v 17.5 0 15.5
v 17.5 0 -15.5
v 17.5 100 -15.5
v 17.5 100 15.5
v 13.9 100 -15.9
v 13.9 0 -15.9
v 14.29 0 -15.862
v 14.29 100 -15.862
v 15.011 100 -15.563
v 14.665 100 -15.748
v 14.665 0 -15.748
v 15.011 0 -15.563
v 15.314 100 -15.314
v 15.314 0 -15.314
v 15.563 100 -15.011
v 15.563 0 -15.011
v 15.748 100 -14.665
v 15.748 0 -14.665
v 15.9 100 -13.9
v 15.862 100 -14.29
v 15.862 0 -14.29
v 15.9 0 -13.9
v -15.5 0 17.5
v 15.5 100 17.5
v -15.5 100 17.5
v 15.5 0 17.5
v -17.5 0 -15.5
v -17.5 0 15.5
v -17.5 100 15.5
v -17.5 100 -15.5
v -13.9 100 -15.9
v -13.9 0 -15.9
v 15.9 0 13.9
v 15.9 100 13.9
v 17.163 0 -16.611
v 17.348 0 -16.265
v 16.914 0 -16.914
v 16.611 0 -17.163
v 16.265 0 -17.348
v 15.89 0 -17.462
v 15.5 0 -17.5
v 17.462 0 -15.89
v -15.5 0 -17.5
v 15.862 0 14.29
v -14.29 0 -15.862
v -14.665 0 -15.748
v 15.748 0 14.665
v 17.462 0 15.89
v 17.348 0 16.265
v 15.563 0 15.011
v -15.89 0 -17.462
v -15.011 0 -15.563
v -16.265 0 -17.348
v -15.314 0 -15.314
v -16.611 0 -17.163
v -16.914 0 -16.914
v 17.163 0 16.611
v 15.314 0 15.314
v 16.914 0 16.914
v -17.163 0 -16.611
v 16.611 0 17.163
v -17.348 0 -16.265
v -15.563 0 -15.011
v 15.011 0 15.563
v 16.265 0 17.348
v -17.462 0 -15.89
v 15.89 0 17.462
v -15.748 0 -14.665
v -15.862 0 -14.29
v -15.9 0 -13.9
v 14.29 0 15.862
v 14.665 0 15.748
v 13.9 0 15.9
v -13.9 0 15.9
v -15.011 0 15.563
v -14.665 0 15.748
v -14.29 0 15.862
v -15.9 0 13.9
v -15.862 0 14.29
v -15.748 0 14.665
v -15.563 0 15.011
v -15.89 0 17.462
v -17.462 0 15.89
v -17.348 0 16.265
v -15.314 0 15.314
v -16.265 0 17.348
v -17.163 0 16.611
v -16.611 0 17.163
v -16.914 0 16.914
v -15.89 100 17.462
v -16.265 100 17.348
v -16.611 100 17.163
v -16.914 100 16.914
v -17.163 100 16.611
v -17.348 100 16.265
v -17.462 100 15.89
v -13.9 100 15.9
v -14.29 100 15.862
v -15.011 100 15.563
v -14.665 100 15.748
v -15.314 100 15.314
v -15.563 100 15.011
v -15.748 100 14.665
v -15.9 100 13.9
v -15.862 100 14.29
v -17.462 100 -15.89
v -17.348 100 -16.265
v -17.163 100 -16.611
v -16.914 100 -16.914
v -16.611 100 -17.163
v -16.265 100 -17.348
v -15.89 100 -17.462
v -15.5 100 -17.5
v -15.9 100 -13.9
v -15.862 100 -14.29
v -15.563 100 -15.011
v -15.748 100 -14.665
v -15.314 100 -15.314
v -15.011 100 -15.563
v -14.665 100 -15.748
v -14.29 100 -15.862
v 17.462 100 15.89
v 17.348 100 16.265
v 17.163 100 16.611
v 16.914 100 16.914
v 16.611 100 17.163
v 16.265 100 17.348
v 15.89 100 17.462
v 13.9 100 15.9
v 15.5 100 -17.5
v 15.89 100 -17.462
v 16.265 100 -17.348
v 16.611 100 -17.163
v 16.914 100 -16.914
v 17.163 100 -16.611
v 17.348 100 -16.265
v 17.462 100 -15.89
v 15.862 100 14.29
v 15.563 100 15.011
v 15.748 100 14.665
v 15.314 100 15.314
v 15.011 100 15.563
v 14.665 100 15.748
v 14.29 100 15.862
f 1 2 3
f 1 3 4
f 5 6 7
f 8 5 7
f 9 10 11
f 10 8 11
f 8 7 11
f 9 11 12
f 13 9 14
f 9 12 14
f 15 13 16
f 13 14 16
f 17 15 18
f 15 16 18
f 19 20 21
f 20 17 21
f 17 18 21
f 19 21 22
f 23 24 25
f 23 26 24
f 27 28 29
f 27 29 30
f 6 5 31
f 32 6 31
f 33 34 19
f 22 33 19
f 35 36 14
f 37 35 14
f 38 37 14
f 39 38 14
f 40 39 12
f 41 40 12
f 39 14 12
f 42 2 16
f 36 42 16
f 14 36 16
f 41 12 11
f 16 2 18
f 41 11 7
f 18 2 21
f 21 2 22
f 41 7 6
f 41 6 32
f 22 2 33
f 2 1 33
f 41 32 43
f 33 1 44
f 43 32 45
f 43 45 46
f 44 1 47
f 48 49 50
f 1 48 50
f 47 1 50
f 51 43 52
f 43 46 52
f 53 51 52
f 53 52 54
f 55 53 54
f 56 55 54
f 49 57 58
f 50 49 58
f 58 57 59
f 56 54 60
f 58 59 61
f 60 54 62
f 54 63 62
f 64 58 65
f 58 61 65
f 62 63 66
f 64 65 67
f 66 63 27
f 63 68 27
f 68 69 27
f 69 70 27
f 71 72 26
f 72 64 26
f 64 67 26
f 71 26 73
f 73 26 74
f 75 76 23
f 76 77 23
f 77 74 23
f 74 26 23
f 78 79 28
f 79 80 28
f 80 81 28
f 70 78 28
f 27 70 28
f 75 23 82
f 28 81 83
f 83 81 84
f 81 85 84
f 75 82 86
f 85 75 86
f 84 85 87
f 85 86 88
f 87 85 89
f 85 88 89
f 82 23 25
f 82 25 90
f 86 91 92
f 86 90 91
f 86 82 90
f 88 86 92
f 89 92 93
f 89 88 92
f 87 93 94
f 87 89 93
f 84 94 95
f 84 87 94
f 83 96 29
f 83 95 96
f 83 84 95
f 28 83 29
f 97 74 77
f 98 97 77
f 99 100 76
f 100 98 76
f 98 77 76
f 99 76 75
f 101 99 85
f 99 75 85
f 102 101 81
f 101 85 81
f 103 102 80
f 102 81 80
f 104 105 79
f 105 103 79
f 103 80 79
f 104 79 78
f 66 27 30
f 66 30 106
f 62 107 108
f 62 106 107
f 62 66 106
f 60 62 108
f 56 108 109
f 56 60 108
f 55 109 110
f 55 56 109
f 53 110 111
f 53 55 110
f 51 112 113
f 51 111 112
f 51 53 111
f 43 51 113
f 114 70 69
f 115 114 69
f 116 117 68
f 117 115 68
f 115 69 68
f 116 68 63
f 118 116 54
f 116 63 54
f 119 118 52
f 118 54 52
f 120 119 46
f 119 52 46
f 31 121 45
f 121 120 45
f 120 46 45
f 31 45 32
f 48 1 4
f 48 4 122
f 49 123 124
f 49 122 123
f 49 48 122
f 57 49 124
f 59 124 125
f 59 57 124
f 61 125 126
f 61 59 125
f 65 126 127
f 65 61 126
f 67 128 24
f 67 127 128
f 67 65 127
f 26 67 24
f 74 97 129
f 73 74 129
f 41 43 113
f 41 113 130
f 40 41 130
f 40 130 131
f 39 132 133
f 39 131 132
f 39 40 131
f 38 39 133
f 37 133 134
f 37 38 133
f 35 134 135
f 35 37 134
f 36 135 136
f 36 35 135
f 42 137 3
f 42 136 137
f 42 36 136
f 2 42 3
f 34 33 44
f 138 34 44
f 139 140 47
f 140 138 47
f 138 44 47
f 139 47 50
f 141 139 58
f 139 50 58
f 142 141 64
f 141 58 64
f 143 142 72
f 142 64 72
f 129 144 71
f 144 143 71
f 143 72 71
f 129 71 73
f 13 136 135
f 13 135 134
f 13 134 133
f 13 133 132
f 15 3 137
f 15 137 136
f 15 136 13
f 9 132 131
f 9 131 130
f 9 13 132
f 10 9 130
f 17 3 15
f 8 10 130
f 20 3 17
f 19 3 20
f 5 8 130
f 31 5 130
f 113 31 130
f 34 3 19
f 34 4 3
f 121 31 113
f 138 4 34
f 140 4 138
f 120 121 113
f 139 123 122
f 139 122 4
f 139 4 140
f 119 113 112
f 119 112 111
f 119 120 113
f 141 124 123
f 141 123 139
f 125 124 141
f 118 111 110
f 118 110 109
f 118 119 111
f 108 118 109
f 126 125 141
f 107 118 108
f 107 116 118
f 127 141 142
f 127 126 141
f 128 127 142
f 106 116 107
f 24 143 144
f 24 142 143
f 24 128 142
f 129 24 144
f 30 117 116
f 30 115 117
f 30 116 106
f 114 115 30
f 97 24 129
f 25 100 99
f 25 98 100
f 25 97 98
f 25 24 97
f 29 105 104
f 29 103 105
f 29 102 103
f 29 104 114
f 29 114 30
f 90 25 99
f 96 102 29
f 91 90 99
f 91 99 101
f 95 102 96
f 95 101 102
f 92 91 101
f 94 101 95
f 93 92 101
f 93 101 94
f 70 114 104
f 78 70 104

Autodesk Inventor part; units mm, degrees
ref_plane "YZ Plane" through (0, 0, 0) normal (1, 0, 0) x (0, 1, 0)
ref_plane "XZ Plane" through (0, 0, 0) normal (0, 1, 0) x (-1, 0, 0)
ref_plane "XY Plane" through (0, 0, 0) normal (0, 0, 1) x (1, 0, 0)
sketch "Sketch1" plane through (0, 0, 0) normal (0, 1, 0) x (-1, 0, 0)
  line L0 (-15.5, 17.5) -> (15.5, 17.5)
  line L1 (17.5, 15.5) -> (17.5, -15.5)
  line L2 (15.5, -17.5) -> (-15.5, -17.5)
  line L3 (-17.5, -15.5) -> (-17.5, 15.5)
  line L4 (-17.5, 17.5) -> (17.5, -17.5) construction
  line L5 (17.5, 17.5) -> (-17.5, -17.5) construction
  line L6 (-13.9, -15.9) -> (13.9, -15.9)
  line L7 (15.9, -13.9) -> (15.9, 13.9)
  line L8 (13.9, 15.9) -> (-13.9, 15.9)
  line L9 (-15.9, 13.9) -> (-15.9, -13.9)
  arc A0 (17.5, 15.5) -> (15.5, 17.5) centre (15.5, 15.5) ccw
  arc A1 (15.5, -17.5) -> (17.5, -15.5) centre (15.5, -15.5) ccw
  arc A2 (-17.5, -15.5) -> (-15.5, -17.5) centre (-15.5, -15.5) ccw
  arc A3 (-15.5, 17.5) -> (-17.5, 15.5) centre (-15.5, 15.5) ccw
  arc A4 (15.9, 13.9) -> (13.9, 15.9) centre (13.9, 13.9) ccw
  arc A5 (13.9, -15.9) -> (15.9, -13.9) centre (13.9, -13.9) ccw
  arc A6 (-15.9, -13.9) -> (-13.9, -15.9) centre (-13.9, -13.9) ccw
  arc A7 (-13.9, 15.9) -> (-15.9, 13.9) centre (-13.9, 13.9) ccw
  point P0 (0, 0)
  dimension "d0" = 35
  dimension "d1" = 35
  dimension "d2" = 1.6
  dimension "d3" = 2
extrude "Extrusion1" add sketch "Sketch1" along normal blind 100
properties part number "AlignmentTube" material "Steel, Mild"
